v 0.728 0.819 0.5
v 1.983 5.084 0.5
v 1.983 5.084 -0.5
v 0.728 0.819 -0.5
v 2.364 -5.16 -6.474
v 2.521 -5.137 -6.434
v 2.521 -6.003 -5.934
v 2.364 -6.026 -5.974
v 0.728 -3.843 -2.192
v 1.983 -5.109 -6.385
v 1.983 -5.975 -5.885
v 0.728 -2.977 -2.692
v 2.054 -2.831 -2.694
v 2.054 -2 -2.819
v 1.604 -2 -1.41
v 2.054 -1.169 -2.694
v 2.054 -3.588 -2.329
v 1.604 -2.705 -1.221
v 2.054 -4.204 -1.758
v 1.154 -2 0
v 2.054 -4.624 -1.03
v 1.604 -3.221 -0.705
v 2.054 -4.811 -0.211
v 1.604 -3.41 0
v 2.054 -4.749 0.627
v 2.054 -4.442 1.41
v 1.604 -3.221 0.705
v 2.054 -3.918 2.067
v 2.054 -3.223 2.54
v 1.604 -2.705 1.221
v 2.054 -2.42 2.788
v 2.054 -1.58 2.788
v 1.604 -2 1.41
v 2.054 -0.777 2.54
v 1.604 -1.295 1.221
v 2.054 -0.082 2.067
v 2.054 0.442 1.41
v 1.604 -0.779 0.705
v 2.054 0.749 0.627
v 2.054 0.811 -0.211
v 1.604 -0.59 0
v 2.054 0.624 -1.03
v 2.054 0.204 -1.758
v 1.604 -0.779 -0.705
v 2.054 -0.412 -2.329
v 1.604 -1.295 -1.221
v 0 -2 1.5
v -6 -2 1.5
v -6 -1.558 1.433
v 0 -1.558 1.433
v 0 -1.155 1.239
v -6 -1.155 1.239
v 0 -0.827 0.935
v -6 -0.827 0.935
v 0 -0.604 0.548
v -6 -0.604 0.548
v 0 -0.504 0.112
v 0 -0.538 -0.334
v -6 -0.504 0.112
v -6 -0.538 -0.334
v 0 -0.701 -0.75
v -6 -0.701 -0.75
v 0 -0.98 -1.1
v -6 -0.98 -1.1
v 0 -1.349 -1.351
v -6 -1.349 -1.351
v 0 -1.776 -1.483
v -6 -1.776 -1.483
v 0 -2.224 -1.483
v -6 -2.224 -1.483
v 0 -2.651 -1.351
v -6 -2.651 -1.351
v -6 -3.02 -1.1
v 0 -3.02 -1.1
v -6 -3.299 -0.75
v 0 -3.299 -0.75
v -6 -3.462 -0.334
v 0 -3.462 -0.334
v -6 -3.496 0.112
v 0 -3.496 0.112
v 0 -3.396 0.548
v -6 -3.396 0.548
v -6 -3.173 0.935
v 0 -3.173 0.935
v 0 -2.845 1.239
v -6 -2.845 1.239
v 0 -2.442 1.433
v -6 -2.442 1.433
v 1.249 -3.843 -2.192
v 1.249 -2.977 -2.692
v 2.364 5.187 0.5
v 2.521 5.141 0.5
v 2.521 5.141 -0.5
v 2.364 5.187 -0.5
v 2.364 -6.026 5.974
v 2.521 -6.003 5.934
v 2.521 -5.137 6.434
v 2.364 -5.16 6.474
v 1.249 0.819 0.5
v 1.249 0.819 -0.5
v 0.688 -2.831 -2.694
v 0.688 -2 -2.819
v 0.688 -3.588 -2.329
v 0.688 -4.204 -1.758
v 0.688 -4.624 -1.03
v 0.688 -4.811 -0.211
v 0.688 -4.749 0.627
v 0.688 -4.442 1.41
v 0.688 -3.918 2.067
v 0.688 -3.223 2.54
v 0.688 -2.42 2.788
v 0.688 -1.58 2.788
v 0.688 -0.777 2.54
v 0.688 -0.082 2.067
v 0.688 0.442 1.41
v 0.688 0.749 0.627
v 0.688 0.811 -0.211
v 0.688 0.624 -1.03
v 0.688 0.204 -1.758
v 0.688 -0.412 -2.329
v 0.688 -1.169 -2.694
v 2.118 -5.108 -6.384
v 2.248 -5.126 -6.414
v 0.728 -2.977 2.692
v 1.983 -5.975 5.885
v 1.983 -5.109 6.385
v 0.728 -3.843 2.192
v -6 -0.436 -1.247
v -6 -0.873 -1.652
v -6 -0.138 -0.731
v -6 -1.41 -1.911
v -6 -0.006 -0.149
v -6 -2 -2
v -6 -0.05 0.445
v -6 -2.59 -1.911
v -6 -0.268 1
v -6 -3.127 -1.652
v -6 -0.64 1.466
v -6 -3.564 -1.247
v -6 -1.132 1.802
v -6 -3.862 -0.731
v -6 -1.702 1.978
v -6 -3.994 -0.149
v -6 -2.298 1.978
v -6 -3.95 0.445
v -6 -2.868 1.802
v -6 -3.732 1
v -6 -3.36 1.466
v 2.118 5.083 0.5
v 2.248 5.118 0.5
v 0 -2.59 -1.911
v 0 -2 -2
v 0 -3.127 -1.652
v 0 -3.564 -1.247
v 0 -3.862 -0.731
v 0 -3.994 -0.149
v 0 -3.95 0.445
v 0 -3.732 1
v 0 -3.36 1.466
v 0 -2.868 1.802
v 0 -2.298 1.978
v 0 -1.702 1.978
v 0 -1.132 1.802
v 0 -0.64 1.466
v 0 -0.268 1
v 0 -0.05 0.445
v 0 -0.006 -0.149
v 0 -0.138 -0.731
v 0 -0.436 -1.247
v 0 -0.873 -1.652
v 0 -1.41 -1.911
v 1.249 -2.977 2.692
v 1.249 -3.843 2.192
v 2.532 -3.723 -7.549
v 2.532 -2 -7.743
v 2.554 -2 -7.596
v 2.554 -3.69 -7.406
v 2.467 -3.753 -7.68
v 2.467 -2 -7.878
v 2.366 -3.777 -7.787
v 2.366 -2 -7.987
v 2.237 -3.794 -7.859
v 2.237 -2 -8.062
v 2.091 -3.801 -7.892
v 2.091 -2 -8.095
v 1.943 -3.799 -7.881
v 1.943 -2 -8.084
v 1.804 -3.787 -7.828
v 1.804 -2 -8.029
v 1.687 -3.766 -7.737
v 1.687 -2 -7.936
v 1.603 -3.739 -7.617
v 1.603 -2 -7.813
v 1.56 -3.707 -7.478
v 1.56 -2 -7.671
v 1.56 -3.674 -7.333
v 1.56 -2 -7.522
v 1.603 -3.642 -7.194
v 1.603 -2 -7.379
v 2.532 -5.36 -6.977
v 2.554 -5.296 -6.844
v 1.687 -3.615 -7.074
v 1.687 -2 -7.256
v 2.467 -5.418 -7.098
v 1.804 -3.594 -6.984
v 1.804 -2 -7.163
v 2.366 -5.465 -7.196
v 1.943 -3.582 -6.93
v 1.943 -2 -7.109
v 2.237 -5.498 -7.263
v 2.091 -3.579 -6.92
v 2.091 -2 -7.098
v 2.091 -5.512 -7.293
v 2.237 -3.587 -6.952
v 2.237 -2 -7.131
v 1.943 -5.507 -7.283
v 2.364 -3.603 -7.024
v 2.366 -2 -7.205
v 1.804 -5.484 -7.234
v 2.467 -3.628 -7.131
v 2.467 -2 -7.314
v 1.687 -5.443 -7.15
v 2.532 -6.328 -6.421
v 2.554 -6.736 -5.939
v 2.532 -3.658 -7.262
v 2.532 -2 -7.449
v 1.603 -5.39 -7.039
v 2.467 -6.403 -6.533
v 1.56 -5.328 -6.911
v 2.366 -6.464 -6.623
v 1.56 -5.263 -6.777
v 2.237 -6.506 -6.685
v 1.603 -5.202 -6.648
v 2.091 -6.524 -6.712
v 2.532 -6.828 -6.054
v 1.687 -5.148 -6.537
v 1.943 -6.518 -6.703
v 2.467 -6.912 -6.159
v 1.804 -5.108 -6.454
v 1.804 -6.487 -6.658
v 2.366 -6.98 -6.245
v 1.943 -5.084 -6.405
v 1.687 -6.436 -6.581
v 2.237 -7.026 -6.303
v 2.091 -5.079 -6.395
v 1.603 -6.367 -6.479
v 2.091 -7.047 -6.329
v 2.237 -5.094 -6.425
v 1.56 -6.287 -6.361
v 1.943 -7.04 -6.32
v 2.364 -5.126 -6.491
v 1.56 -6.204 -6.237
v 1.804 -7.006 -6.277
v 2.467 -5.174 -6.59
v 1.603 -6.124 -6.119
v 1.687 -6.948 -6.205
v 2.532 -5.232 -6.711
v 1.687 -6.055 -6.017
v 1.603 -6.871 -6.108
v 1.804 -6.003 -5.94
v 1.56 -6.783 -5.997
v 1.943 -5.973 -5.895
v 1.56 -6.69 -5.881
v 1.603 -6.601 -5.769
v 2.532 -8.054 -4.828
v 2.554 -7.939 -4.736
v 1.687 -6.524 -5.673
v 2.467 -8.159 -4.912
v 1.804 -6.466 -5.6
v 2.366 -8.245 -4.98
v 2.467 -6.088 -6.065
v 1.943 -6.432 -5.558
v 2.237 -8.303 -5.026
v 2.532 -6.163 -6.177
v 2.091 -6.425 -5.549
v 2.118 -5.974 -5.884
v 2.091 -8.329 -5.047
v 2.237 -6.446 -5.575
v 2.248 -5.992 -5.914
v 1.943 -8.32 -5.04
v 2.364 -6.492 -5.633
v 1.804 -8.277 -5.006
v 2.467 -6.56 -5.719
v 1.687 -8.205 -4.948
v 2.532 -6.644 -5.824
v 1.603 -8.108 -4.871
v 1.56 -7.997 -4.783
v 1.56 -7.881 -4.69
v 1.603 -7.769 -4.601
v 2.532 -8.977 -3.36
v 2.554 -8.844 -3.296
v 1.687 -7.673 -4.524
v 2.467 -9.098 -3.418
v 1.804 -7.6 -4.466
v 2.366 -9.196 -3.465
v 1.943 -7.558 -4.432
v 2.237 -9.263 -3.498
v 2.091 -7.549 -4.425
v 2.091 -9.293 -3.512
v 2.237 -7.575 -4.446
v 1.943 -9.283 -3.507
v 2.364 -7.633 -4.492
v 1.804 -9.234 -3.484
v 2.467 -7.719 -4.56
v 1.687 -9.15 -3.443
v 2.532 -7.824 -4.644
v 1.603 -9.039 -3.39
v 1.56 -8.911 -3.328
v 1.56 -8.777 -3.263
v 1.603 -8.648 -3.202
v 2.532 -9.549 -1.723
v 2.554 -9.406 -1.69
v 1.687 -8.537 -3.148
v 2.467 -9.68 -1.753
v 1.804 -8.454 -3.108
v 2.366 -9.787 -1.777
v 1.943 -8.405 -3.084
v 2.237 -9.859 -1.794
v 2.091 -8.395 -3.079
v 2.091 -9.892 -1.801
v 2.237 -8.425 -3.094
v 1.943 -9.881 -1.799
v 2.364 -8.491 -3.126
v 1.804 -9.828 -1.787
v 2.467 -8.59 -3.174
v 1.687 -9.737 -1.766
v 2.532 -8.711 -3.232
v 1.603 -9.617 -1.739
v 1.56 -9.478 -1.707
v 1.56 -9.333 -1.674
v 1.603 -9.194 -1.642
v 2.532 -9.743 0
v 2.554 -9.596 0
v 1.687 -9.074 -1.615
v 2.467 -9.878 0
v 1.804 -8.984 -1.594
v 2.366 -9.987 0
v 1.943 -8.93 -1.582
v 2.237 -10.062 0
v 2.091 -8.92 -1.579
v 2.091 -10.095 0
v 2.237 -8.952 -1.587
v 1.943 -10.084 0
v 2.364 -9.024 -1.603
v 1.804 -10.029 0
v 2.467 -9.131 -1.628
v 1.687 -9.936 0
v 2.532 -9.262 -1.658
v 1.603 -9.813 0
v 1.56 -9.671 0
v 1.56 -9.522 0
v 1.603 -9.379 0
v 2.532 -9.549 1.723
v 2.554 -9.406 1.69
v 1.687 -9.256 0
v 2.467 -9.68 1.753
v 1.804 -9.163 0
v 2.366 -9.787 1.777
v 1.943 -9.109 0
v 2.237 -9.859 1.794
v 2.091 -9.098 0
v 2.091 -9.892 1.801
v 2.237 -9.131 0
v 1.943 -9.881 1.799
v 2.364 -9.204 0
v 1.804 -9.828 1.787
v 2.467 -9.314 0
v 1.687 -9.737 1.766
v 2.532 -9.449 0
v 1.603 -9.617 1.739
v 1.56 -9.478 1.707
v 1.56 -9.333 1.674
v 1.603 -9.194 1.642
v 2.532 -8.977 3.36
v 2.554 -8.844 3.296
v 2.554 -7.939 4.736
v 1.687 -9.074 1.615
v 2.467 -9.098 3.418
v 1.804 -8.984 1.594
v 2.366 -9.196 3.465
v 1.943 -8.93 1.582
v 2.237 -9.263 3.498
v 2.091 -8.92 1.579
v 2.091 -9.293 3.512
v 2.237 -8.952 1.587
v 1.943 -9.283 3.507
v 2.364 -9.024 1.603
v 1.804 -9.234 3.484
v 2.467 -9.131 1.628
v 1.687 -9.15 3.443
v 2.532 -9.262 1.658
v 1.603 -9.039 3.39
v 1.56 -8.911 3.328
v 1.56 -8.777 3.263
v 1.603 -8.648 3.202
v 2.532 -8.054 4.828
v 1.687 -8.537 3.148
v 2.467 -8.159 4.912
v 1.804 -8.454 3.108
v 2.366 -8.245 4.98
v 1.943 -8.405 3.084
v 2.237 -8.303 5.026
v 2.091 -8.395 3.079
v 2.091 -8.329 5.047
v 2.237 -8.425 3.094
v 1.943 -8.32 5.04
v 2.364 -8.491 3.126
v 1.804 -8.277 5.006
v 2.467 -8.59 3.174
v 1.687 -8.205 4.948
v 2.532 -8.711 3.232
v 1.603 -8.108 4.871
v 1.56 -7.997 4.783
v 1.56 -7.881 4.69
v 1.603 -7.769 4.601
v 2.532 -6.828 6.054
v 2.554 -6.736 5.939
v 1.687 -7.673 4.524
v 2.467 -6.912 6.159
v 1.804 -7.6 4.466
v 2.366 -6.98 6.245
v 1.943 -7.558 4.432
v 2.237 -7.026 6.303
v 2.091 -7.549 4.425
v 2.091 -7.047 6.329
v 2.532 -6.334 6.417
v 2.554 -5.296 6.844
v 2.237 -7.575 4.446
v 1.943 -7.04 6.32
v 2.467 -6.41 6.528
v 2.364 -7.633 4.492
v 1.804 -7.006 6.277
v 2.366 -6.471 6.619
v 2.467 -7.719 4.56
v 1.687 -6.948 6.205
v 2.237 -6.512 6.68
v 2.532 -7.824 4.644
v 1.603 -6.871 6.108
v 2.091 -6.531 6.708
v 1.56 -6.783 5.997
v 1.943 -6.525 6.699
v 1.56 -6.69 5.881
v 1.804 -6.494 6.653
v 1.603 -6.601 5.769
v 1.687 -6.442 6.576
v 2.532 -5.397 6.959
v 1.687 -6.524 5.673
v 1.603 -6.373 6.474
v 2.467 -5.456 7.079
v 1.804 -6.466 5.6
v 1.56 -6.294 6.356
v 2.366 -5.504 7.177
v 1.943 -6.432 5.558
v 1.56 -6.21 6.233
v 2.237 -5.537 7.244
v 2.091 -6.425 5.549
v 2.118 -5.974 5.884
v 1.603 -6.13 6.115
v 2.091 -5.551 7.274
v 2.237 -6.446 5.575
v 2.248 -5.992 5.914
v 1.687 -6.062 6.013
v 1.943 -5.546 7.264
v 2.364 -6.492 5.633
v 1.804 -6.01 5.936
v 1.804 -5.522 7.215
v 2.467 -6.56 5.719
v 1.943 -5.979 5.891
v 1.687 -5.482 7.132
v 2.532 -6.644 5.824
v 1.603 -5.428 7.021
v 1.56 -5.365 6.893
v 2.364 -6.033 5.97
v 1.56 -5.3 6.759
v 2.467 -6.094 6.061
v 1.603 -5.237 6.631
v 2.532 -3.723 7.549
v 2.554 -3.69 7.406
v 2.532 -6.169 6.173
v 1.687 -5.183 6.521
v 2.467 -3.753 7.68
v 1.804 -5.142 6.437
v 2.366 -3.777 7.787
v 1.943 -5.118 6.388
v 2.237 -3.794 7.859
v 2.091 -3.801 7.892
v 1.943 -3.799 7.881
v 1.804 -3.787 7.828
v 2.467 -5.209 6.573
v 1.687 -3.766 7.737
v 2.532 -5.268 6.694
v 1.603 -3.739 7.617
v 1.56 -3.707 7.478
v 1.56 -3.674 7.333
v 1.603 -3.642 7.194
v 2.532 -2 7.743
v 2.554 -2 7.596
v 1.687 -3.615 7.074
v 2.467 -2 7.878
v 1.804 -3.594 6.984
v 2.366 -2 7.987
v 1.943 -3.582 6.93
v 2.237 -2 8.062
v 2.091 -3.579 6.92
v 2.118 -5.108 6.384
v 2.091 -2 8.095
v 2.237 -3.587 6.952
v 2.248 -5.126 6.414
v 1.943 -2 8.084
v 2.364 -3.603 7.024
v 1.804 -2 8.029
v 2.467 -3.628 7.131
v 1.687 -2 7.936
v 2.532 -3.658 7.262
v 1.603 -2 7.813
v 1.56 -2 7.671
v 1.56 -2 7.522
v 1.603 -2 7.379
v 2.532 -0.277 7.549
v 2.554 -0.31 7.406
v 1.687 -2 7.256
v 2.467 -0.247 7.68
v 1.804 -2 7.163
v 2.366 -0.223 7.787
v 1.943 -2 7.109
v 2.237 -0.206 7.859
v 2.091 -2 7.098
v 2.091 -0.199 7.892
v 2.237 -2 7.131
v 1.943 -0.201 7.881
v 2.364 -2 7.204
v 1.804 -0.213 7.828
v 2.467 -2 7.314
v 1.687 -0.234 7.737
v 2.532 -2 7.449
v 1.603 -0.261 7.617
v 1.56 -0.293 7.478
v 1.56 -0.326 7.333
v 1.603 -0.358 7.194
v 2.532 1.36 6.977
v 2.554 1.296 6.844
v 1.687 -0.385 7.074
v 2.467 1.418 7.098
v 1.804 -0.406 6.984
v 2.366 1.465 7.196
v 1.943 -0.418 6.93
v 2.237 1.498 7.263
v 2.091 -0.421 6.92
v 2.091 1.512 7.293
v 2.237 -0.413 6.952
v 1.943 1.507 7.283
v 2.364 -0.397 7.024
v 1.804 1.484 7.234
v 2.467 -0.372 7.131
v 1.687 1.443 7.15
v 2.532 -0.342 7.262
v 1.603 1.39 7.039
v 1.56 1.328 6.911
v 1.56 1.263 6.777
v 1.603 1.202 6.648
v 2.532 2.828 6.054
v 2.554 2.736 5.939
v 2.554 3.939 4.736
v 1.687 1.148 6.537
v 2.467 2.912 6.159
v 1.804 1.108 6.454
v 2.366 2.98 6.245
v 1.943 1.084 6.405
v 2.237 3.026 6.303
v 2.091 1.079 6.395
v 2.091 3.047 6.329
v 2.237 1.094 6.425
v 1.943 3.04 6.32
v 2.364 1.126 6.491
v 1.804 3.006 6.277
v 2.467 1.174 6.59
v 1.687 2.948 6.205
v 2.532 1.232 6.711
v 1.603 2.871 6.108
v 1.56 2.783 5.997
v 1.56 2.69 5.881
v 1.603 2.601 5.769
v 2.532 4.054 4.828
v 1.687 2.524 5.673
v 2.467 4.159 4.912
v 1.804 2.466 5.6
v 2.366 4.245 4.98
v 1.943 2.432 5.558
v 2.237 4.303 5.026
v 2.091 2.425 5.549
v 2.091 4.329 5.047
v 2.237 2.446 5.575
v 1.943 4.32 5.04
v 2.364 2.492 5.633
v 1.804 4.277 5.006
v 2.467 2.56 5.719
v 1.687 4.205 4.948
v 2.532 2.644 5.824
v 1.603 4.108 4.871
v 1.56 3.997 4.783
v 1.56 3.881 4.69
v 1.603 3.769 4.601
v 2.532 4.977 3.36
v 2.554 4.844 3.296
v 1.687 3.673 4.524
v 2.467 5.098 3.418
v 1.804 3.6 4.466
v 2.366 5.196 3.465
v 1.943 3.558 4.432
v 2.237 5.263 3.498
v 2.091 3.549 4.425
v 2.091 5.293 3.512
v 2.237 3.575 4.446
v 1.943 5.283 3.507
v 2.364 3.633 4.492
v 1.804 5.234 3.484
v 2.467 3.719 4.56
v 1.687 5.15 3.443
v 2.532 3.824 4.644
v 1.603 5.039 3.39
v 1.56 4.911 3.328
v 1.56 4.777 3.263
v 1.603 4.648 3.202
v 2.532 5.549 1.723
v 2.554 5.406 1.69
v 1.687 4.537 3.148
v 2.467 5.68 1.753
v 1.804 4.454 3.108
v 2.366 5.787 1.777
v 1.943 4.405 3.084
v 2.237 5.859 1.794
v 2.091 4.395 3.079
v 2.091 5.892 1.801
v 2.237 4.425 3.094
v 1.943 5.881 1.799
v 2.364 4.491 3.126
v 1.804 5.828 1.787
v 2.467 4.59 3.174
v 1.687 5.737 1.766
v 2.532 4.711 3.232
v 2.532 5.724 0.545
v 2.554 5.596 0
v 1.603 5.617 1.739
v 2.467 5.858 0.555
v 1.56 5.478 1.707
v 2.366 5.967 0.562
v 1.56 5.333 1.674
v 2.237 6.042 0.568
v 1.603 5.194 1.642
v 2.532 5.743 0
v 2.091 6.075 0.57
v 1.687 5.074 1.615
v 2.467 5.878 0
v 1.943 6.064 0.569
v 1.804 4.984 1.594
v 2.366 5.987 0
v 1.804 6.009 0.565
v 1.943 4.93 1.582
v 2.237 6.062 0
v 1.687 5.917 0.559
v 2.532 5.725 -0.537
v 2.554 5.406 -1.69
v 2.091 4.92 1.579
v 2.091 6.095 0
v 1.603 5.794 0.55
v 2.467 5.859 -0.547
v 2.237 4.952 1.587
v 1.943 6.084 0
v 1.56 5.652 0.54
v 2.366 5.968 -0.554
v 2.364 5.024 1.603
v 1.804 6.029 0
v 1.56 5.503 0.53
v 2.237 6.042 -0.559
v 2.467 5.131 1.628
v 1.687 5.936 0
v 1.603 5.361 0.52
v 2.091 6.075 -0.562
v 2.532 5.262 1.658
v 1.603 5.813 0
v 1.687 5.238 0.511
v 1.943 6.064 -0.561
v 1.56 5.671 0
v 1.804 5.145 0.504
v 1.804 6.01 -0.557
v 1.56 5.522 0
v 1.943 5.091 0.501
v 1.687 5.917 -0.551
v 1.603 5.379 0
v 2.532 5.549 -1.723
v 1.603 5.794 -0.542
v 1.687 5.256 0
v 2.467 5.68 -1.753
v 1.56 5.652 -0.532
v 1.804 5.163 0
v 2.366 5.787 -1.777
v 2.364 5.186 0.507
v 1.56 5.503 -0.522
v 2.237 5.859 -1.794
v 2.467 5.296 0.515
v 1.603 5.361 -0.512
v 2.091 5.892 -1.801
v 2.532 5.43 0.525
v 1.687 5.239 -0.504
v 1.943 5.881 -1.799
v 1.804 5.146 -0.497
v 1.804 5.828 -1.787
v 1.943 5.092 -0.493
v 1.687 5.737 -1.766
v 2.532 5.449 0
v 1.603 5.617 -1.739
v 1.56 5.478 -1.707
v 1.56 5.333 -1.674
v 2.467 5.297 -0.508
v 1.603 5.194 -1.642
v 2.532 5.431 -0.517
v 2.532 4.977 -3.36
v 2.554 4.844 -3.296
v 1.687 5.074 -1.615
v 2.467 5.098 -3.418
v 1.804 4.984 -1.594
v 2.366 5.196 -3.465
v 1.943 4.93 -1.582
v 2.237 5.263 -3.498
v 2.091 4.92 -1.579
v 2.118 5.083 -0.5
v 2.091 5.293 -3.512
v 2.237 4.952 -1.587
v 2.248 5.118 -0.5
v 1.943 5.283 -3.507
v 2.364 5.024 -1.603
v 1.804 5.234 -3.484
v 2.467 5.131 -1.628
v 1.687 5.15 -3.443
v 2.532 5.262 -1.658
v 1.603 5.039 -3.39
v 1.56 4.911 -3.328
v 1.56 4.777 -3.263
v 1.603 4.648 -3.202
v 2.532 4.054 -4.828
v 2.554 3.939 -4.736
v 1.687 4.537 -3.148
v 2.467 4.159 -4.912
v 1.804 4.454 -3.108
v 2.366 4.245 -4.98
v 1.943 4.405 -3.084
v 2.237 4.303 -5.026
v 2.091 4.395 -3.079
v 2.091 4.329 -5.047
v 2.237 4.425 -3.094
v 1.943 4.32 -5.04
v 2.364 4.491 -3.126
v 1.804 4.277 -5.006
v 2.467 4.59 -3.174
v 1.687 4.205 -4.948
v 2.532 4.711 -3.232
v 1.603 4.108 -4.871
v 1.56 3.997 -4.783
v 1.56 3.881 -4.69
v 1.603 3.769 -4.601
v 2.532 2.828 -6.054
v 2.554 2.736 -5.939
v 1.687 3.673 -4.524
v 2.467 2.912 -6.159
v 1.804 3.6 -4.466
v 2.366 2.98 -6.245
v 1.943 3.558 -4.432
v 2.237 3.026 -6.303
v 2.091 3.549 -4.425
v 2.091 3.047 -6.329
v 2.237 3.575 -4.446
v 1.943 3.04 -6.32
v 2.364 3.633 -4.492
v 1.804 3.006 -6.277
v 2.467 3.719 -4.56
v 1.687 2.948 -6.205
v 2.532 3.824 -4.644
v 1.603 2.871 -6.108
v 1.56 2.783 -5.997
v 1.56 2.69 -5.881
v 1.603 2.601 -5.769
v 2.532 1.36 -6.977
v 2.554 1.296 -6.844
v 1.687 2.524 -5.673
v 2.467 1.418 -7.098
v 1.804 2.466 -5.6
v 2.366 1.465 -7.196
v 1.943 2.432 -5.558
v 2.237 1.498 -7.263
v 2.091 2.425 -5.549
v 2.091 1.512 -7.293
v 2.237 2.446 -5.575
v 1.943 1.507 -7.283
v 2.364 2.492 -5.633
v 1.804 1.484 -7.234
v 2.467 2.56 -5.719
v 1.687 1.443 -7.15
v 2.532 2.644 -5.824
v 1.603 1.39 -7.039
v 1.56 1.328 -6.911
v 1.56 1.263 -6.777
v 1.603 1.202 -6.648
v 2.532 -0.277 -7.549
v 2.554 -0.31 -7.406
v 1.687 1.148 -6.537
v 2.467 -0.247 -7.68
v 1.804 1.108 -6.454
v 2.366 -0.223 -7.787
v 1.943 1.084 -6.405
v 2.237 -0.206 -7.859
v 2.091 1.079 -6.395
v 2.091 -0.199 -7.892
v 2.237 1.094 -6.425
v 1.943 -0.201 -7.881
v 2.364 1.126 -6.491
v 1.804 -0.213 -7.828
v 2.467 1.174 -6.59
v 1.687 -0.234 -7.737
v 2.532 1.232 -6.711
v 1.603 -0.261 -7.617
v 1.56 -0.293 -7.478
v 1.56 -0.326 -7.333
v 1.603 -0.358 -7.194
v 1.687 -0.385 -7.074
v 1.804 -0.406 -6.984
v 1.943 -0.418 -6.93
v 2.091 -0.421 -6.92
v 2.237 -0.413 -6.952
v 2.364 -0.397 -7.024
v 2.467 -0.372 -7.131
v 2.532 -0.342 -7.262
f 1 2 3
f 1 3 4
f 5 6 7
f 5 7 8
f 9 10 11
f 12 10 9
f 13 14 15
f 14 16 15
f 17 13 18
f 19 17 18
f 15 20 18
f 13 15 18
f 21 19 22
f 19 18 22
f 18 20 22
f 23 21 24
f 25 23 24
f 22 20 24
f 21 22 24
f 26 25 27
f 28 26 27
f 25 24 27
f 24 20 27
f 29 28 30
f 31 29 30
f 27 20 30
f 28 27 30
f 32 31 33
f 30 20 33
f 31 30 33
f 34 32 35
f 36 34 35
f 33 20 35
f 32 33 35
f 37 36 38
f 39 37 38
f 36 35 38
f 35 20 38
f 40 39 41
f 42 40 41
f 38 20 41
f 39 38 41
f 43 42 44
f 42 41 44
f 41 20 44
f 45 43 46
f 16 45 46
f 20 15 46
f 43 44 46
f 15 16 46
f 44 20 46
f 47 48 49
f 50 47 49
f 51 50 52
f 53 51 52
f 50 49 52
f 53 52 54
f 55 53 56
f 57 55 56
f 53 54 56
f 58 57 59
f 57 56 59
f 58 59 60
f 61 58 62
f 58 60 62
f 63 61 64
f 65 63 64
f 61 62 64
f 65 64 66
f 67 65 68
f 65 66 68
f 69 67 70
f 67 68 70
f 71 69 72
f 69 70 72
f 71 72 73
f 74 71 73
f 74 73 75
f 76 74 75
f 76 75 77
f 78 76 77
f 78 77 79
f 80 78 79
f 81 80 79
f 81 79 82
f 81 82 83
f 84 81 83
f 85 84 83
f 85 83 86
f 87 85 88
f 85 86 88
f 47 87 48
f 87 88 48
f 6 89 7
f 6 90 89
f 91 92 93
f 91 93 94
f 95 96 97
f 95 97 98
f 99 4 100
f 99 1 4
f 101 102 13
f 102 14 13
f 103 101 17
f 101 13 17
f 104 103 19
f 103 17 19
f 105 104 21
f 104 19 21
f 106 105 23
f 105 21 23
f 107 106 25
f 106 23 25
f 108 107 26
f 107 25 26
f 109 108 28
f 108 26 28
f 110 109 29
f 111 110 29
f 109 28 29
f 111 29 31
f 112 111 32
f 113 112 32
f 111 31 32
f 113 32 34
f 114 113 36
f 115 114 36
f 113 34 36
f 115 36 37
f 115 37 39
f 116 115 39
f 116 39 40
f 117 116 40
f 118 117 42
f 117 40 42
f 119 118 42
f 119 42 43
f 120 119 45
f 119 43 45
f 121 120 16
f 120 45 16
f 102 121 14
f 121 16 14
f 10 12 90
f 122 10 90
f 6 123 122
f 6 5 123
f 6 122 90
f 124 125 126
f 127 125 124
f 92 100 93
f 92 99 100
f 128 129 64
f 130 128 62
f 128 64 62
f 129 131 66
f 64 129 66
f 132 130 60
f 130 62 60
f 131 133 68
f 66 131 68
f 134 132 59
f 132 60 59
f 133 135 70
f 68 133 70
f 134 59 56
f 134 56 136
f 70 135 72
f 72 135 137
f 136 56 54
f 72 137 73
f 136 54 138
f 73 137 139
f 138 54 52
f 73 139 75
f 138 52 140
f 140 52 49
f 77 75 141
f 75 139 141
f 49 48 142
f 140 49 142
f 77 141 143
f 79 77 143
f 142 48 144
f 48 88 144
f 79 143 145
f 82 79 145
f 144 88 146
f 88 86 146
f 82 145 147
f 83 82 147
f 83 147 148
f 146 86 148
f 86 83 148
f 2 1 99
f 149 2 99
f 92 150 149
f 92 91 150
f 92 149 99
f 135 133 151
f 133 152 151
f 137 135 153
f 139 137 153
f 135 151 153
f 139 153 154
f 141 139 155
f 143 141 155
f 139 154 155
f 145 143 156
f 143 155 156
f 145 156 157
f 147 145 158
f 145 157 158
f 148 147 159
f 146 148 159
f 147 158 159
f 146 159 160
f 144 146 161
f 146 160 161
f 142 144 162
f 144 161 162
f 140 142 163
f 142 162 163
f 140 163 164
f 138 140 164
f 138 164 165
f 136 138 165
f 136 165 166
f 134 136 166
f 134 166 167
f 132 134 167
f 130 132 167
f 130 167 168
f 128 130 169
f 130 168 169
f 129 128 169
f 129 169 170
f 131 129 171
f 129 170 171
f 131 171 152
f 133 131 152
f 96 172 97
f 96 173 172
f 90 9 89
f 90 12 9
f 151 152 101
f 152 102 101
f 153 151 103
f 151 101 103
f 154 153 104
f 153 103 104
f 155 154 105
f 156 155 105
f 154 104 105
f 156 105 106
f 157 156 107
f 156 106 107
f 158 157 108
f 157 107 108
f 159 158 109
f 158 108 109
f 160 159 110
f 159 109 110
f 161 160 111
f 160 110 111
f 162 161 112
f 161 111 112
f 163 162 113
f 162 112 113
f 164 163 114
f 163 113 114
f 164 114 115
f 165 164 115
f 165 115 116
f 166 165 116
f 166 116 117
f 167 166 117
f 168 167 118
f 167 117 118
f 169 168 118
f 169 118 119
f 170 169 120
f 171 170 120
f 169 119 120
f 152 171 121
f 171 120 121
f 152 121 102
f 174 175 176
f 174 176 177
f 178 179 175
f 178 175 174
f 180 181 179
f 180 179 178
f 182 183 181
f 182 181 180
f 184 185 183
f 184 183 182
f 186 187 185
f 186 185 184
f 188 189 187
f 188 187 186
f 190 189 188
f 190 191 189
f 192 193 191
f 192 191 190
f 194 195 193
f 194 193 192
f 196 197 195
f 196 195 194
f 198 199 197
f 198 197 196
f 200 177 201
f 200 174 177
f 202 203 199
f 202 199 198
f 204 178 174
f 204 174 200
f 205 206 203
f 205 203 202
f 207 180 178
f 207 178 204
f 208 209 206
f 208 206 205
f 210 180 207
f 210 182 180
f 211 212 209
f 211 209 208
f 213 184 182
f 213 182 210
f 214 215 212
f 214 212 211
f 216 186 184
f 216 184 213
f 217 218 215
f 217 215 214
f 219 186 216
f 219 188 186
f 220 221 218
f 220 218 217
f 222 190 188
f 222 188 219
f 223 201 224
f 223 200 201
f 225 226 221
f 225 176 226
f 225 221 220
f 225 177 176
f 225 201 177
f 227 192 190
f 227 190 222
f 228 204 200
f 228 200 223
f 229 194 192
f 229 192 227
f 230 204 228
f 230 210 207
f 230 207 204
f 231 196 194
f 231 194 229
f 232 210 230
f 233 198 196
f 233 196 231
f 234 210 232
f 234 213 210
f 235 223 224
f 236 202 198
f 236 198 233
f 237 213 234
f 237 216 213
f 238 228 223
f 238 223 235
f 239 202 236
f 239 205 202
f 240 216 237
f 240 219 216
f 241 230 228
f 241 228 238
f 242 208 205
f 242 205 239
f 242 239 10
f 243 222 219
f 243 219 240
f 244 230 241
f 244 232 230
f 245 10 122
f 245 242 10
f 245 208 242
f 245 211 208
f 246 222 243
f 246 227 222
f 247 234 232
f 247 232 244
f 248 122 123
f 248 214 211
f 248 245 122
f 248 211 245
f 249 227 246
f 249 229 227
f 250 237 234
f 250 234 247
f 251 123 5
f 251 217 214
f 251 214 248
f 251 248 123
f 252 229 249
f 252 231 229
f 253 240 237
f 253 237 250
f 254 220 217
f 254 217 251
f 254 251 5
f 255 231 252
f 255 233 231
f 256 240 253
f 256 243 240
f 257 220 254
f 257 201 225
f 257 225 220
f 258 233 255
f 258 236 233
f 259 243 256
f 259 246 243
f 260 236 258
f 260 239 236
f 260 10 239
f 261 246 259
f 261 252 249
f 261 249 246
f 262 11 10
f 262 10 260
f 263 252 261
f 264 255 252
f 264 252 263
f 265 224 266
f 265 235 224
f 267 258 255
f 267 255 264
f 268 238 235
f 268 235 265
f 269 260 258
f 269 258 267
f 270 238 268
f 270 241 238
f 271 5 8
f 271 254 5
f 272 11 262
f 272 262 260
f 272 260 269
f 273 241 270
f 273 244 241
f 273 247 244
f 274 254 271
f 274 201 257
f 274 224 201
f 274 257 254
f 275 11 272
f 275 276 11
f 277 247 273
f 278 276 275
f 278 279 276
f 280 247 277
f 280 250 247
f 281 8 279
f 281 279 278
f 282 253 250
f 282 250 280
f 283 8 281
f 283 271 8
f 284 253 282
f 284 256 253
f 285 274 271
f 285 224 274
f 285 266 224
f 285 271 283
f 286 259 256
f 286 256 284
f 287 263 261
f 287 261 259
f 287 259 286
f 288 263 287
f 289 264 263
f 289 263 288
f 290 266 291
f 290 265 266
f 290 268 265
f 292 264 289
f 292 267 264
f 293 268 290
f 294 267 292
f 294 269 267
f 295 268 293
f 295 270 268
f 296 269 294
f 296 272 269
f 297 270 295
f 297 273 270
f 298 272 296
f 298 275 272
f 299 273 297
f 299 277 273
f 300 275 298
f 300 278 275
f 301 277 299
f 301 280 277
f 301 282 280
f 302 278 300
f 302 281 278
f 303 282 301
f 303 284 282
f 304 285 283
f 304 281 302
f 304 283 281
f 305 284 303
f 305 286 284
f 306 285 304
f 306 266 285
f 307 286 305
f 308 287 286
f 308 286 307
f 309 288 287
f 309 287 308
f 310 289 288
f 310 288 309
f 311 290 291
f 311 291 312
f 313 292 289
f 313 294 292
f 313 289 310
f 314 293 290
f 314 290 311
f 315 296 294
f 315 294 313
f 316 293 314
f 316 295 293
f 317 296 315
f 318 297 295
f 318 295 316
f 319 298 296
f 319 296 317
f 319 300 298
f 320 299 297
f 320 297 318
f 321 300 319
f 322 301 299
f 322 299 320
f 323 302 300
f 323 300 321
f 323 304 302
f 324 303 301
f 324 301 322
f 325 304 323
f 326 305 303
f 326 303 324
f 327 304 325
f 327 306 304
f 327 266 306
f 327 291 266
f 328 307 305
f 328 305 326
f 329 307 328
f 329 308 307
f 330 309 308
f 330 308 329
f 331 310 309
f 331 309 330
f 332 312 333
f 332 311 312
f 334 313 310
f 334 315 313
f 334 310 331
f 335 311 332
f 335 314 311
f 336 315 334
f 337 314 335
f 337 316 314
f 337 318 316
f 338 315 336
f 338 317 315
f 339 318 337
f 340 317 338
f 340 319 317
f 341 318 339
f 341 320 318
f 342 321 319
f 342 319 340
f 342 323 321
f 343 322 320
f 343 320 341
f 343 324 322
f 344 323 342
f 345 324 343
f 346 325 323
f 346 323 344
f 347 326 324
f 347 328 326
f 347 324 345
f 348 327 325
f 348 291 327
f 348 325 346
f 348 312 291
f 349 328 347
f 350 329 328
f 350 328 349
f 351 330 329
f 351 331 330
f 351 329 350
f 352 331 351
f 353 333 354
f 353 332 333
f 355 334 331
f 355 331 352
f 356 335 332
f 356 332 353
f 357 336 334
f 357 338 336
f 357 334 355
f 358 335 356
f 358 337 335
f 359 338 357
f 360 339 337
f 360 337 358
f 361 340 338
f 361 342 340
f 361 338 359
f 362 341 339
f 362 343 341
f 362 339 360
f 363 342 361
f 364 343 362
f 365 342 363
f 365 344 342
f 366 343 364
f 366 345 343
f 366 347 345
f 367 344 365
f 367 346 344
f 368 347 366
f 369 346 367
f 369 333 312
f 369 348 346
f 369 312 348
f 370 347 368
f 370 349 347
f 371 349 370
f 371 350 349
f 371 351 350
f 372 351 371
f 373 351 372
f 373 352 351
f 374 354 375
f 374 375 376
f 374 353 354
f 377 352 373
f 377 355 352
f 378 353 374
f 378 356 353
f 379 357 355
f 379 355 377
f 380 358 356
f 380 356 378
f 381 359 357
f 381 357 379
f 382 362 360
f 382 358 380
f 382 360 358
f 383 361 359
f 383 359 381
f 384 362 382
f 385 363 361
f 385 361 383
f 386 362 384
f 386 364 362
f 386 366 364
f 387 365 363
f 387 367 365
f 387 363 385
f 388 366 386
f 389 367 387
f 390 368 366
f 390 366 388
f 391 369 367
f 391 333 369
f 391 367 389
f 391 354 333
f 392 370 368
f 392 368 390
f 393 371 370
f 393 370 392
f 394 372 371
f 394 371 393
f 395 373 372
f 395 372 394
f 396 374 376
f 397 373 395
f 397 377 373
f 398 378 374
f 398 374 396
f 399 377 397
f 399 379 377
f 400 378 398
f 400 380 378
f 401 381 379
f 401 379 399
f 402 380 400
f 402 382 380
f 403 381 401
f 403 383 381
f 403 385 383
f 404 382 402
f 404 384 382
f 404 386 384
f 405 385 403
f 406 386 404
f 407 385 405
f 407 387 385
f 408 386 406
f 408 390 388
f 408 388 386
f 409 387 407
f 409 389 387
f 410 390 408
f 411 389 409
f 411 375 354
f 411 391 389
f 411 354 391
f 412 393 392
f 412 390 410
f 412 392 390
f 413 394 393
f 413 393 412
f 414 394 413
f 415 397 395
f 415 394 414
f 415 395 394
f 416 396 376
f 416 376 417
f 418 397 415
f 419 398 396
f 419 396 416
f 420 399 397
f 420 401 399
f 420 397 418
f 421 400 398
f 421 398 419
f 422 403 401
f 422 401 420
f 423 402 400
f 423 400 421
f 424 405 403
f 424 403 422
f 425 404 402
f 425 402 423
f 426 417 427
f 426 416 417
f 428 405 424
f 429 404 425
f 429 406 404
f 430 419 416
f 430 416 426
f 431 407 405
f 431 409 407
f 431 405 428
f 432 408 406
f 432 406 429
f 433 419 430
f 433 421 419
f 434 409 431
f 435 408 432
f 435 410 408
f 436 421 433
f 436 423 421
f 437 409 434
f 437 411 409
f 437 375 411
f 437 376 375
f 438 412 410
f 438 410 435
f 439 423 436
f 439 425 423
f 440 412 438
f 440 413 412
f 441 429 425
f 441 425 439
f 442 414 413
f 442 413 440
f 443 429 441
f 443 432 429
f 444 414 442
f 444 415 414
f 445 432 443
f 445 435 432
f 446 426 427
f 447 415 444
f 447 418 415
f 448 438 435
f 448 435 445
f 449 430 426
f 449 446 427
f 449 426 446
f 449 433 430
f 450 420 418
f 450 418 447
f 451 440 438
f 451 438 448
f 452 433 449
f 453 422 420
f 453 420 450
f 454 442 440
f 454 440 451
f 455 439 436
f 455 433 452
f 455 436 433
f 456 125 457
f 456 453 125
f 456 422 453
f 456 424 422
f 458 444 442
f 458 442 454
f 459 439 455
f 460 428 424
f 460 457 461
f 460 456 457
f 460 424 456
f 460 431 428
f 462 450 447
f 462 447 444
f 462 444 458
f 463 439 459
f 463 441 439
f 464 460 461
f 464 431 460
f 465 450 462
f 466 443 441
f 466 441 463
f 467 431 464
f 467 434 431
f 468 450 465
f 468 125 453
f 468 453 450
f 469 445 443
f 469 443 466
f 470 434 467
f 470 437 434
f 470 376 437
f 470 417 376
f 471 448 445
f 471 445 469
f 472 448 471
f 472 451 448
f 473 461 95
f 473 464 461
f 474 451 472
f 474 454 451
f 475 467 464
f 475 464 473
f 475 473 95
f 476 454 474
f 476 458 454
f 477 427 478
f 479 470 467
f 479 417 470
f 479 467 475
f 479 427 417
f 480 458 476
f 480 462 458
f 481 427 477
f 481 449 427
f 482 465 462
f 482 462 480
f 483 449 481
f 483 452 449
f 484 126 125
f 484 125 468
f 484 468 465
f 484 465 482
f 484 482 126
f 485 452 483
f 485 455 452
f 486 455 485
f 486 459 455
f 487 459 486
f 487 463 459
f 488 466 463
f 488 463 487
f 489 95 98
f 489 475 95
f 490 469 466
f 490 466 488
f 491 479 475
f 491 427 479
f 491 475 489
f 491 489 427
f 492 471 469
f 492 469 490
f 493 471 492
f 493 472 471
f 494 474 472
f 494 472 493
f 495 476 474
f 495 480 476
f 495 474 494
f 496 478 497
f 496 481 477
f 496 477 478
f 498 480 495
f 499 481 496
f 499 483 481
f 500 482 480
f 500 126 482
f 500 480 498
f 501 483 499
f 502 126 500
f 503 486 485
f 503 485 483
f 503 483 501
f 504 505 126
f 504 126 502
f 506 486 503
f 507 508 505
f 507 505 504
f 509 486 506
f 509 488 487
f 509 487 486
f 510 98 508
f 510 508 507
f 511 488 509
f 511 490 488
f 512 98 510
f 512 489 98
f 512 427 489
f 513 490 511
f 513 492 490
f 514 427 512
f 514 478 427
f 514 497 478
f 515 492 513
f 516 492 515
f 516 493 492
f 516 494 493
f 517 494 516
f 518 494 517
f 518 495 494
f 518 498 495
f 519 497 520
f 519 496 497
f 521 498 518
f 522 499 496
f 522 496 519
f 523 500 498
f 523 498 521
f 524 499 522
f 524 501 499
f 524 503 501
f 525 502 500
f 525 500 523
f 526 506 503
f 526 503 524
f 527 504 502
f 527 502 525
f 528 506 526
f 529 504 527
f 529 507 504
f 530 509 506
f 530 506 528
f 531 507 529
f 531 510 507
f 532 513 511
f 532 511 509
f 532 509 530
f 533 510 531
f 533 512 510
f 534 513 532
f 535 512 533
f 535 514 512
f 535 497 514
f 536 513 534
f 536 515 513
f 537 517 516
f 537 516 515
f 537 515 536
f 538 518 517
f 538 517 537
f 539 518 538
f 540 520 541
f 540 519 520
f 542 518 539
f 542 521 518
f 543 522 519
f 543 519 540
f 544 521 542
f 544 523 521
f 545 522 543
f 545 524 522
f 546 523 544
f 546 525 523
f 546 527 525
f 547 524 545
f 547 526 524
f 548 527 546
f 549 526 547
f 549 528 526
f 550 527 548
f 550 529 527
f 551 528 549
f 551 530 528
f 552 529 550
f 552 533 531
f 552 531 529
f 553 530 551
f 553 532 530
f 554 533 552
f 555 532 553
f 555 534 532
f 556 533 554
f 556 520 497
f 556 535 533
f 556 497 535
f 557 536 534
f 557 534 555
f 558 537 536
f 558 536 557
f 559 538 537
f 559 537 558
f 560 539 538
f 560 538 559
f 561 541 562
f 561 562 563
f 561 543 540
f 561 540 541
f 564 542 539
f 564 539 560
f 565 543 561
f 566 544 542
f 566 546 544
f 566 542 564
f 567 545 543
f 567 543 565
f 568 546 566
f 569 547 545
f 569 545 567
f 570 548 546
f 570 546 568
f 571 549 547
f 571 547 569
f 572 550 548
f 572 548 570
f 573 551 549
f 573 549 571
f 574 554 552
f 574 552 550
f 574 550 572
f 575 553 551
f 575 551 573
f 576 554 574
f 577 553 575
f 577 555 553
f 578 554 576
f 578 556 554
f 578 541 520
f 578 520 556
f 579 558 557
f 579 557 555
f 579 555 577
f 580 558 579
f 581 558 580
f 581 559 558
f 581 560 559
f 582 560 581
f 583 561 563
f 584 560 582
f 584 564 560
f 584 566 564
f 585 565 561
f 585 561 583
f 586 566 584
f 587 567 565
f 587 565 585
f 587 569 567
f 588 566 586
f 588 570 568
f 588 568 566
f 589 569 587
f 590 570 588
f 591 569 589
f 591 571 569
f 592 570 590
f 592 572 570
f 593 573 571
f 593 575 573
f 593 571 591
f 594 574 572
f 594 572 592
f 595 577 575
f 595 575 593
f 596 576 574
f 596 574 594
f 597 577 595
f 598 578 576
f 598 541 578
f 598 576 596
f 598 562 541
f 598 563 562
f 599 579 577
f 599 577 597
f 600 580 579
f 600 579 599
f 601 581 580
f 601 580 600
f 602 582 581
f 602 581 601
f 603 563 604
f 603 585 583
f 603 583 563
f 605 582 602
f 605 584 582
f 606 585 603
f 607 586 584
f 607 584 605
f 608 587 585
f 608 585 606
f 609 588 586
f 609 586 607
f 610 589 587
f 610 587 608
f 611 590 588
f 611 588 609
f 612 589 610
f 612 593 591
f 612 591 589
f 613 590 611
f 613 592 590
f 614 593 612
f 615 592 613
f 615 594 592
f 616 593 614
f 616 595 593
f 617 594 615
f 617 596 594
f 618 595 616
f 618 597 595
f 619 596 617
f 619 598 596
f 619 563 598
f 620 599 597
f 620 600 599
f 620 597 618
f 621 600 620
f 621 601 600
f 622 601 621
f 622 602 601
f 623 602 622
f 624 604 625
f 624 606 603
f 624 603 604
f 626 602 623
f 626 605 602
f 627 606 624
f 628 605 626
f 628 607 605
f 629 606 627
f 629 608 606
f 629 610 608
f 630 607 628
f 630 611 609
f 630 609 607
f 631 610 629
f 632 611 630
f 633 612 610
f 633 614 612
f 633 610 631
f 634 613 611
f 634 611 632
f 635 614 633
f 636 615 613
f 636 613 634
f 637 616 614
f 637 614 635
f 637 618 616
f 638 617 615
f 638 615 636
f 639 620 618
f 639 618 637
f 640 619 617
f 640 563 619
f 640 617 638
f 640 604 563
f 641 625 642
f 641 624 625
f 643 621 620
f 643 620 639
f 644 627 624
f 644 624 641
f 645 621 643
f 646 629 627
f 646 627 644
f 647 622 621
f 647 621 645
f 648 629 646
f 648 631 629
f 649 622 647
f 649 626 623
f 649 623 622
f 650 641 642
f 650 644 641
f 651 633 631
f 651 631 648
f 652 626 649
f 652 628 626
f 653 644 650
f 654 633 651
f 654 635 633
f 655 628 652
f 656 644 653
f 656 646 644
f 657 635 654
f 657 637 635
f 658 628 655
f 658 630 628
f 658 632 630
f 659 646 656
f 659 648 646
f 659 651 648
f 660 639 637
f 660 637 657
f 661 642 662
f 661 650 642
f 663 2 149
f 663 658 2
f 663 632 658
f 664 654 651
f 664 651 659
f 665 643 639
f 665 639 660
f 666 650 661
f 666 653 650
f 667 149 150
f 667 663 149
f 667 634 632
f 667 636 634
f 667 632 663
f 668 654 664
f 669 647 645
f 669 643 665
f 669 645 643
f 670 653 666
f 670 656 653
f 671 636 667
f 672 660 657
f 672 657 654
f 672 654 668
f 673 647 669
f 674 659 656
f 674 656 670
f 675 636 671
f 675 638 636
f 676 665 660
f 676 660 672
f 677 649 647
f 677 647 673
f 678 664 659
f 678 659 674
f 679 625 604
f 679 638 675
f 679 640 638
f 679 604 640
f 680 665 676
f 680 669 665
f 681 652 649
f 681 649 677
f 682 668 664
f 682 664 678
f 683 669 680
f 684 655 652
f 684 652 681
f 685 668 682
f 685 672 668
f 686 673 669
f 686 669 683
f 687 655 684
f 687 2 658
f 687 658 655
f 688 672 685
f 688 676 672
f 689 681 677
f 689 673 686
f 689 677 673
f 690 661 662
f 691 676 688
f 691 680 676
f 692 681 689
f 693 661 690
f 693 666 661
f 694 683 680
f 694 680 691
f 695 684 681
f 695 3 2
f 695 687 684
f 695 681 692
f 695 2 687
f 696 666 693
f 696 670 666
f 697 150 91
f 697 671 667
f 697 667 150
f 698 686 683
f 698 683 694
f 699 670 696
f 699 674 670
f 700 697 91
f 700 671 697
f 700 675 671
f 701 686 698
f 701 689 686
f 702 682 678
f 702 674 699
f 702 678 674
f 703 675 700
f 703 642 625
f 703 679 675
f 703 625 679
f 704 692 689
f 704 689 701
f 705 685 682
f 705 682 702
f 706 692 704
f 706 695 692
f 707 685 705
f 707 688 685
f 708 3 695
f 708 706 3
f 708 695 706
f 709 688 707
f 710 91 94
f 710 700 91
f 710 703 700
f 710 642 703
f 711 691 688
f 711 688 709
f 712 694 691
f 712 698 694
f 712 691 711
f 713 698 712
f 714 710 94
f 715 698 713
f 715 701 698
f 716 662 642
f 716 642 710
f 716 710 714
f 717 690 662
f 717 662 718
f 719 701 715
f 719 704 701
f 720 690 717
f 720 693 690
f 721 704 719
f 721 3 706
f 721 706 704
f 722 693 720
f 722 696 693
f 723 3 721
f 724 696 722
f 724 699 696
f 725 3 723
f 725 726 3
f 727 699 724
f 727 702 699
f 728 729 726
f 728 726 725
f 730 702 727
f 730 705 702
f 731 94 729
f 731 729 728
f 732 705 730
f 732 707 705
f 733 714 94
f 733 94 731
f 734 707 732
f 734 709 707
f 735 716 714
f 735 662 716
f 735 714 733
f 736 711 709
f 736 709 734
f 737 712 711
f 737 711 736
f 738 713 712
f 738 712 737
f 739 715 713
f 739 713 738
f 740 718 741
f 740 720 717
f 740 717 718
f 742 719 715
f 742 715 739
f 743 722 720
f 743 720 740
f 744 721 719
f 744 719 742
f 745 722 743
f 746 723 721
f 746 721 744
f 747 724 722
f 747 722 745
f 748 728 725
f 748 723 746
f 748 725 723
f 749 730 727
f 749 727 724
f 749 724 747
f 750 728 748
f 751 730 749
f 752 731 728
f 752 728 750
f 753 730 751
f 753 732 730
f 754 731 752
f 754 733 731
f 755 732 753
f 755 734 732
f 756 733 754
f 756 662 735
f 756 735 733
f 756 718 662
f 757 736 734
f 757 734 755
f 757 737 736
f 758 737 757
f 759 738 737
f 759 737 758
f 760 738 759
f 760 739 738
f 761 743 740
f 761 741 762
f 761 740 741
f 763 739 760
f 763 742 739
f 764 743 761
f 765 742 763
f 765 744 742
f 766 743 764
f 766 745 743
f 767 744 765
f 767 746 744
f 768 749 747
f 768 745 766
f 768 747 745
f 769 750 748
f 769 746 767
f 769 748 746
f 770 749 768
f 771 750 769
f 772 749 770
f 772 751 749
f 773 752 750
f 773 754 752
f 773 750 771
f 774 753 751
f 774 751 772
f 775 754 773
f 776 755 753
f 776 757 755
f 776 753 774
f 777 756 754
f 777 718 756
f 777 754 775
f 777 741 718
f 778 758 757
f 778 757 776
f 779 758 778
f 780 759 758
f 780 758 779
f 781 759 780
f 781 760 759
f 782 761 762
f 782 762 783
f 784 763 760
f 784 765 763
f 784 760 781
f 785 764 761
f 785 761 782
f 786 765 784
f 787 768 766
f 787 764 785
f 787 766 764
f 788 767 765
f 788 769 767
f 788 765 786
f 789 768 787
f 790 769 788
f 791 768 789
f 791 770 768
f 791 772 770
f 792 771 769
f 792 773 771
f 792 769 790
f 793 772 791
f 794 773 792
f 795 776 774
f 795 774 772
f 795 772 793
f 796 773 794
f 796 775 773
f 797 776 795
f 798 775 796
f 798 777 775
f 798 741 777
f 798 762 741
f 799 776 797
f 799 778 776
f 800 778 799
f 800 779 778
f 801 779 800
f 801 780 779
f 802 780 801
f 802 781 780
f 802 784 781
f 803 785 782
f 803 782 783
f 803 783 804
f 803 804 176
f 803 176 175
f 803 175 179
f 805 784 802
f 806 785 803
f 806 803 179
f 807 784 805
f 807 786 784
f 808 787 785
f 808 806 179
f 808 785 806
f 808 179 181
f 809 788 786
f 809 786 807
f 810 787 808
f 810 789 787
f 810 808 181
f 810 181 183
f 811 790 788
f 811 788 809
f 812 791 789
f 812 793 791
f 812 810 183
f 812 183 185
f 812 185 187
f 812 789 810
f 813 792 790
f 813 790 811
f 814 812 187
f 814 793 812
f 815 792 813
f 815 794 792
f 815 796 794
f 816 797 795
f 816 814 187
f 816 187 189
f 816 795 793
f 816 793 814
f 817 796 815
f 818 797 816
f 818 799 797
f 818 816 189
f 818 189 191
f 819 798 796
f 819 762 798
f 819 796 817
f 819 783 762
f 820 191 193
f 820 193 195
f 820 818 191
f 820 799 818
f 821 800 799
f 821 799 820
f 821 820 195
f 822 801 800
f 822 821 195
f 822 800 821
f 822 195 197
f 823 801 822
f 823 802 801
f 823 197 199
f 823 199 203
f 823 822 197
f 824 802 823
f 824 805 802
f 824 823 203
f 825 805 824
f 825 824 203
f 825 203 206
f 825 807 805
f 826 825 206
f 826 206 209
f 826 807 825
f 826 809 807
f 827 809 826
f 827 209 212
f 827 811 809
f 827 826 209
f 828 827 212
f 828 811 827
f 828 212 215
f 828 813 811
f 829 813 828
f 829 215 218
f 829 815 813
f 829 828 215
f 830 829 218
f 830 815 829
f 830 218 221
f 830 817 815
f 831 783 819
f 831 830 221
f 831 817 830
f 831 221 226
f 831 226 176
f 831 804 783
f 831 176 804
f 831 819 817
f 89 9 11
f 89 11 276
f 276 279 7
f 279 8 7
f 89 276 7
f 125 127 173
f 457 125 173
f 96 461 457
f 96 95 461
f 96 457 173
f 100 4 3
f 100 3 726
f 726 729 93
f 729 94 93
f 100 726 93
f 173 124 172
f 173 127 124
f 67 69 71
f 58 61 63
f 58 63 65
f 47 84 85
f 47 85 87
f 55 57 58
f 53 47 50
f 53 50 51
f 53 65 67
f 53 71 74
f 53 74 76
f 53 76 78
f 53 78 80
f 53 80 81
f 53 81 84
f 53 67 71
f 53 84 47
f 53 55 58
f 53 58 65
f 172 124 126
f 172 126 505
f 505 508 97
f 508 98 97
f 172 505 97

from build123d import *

# Parameters (mm, degrees)
SKETCH2_R           = 1.5
CUT_EXTRUDE1_DEPTH  = 6
SKETCH3_R           = 0.5
BOSS_EXTRUDE1_DEPTH = 0.5
CIRPATTERN1_COUNT   = 3


with BuildPart() as part:
    # Sketch1 → Revolve1 (revolve)
    with BuildSketch(Plane.XY, mode=Mode.PRIVATE) as revolve1_sk:
        Polygon((-6, 0), (0, 0), (0.687541683, 0.81938027), (2.053921281, 0.81938027), (1.153569134, -2), (-6, -2), align=None)
    revolve(revolve1_sk.sketch.rotate(Axis((1.153569134, -2, 0), (-1, 0, 0)), 90), axis=Axis((1.153569134, -2, 0), (-1, 0, 0)))

    # Sketch2 → Cut-Extrude1 (cut)
    with BuildSketch(Plane.ZY.offset(6)):
        with Locations((0, -2)):
            Circle(SKETCH2_R)
    extrude(amount=-CUT_EXTRUDE1_DEPTH, mode=Mode.SUBTRACT)


with BuildPart() as body_2:
    # Sketch3 → Revolve2 (revolve)
    with BuildSketch(Plane.XY, mode=Mode.PRIVATE) as revolve2_sk:
        with Locations((2.053921281, 5.596117166)):
            Circle(SKETCH3_R)
    revolve(revolve2_sk.sketch.rotate(Axis((-6, -2, 0), (-1, 0, 0)), 90), axis=Axis((-6, -2, 0), (-1, 0, 0)))

    # Sketch4 → Boss-Extrude1 (add, symmetric)
    with BuildSketch(Plane.XY):
        Polygon((1.2492948, 0.81938027), (2.521024293, 5.140817594), (2.041363137, 5.281974157), (0.728093538, 0.81938027), align=None)
    boss_extrude1 = extrude(amount=BOSS_EXTRUDE1_DEPTH, both=True)

    # CirPattern1: Boss-Extrude1 ×3 about axis
    cirpattern1_axis = Axis((0, -2, 0), (1, 0, 0))
    for i in range(1, CIRPATTERN1_COUNT):
        add(boss_extrude1.rotate(cirpattern1_axis, i * 360 / CIRPATTERN1_COUNT))


solid = Compound([part.part, body_2.part])
